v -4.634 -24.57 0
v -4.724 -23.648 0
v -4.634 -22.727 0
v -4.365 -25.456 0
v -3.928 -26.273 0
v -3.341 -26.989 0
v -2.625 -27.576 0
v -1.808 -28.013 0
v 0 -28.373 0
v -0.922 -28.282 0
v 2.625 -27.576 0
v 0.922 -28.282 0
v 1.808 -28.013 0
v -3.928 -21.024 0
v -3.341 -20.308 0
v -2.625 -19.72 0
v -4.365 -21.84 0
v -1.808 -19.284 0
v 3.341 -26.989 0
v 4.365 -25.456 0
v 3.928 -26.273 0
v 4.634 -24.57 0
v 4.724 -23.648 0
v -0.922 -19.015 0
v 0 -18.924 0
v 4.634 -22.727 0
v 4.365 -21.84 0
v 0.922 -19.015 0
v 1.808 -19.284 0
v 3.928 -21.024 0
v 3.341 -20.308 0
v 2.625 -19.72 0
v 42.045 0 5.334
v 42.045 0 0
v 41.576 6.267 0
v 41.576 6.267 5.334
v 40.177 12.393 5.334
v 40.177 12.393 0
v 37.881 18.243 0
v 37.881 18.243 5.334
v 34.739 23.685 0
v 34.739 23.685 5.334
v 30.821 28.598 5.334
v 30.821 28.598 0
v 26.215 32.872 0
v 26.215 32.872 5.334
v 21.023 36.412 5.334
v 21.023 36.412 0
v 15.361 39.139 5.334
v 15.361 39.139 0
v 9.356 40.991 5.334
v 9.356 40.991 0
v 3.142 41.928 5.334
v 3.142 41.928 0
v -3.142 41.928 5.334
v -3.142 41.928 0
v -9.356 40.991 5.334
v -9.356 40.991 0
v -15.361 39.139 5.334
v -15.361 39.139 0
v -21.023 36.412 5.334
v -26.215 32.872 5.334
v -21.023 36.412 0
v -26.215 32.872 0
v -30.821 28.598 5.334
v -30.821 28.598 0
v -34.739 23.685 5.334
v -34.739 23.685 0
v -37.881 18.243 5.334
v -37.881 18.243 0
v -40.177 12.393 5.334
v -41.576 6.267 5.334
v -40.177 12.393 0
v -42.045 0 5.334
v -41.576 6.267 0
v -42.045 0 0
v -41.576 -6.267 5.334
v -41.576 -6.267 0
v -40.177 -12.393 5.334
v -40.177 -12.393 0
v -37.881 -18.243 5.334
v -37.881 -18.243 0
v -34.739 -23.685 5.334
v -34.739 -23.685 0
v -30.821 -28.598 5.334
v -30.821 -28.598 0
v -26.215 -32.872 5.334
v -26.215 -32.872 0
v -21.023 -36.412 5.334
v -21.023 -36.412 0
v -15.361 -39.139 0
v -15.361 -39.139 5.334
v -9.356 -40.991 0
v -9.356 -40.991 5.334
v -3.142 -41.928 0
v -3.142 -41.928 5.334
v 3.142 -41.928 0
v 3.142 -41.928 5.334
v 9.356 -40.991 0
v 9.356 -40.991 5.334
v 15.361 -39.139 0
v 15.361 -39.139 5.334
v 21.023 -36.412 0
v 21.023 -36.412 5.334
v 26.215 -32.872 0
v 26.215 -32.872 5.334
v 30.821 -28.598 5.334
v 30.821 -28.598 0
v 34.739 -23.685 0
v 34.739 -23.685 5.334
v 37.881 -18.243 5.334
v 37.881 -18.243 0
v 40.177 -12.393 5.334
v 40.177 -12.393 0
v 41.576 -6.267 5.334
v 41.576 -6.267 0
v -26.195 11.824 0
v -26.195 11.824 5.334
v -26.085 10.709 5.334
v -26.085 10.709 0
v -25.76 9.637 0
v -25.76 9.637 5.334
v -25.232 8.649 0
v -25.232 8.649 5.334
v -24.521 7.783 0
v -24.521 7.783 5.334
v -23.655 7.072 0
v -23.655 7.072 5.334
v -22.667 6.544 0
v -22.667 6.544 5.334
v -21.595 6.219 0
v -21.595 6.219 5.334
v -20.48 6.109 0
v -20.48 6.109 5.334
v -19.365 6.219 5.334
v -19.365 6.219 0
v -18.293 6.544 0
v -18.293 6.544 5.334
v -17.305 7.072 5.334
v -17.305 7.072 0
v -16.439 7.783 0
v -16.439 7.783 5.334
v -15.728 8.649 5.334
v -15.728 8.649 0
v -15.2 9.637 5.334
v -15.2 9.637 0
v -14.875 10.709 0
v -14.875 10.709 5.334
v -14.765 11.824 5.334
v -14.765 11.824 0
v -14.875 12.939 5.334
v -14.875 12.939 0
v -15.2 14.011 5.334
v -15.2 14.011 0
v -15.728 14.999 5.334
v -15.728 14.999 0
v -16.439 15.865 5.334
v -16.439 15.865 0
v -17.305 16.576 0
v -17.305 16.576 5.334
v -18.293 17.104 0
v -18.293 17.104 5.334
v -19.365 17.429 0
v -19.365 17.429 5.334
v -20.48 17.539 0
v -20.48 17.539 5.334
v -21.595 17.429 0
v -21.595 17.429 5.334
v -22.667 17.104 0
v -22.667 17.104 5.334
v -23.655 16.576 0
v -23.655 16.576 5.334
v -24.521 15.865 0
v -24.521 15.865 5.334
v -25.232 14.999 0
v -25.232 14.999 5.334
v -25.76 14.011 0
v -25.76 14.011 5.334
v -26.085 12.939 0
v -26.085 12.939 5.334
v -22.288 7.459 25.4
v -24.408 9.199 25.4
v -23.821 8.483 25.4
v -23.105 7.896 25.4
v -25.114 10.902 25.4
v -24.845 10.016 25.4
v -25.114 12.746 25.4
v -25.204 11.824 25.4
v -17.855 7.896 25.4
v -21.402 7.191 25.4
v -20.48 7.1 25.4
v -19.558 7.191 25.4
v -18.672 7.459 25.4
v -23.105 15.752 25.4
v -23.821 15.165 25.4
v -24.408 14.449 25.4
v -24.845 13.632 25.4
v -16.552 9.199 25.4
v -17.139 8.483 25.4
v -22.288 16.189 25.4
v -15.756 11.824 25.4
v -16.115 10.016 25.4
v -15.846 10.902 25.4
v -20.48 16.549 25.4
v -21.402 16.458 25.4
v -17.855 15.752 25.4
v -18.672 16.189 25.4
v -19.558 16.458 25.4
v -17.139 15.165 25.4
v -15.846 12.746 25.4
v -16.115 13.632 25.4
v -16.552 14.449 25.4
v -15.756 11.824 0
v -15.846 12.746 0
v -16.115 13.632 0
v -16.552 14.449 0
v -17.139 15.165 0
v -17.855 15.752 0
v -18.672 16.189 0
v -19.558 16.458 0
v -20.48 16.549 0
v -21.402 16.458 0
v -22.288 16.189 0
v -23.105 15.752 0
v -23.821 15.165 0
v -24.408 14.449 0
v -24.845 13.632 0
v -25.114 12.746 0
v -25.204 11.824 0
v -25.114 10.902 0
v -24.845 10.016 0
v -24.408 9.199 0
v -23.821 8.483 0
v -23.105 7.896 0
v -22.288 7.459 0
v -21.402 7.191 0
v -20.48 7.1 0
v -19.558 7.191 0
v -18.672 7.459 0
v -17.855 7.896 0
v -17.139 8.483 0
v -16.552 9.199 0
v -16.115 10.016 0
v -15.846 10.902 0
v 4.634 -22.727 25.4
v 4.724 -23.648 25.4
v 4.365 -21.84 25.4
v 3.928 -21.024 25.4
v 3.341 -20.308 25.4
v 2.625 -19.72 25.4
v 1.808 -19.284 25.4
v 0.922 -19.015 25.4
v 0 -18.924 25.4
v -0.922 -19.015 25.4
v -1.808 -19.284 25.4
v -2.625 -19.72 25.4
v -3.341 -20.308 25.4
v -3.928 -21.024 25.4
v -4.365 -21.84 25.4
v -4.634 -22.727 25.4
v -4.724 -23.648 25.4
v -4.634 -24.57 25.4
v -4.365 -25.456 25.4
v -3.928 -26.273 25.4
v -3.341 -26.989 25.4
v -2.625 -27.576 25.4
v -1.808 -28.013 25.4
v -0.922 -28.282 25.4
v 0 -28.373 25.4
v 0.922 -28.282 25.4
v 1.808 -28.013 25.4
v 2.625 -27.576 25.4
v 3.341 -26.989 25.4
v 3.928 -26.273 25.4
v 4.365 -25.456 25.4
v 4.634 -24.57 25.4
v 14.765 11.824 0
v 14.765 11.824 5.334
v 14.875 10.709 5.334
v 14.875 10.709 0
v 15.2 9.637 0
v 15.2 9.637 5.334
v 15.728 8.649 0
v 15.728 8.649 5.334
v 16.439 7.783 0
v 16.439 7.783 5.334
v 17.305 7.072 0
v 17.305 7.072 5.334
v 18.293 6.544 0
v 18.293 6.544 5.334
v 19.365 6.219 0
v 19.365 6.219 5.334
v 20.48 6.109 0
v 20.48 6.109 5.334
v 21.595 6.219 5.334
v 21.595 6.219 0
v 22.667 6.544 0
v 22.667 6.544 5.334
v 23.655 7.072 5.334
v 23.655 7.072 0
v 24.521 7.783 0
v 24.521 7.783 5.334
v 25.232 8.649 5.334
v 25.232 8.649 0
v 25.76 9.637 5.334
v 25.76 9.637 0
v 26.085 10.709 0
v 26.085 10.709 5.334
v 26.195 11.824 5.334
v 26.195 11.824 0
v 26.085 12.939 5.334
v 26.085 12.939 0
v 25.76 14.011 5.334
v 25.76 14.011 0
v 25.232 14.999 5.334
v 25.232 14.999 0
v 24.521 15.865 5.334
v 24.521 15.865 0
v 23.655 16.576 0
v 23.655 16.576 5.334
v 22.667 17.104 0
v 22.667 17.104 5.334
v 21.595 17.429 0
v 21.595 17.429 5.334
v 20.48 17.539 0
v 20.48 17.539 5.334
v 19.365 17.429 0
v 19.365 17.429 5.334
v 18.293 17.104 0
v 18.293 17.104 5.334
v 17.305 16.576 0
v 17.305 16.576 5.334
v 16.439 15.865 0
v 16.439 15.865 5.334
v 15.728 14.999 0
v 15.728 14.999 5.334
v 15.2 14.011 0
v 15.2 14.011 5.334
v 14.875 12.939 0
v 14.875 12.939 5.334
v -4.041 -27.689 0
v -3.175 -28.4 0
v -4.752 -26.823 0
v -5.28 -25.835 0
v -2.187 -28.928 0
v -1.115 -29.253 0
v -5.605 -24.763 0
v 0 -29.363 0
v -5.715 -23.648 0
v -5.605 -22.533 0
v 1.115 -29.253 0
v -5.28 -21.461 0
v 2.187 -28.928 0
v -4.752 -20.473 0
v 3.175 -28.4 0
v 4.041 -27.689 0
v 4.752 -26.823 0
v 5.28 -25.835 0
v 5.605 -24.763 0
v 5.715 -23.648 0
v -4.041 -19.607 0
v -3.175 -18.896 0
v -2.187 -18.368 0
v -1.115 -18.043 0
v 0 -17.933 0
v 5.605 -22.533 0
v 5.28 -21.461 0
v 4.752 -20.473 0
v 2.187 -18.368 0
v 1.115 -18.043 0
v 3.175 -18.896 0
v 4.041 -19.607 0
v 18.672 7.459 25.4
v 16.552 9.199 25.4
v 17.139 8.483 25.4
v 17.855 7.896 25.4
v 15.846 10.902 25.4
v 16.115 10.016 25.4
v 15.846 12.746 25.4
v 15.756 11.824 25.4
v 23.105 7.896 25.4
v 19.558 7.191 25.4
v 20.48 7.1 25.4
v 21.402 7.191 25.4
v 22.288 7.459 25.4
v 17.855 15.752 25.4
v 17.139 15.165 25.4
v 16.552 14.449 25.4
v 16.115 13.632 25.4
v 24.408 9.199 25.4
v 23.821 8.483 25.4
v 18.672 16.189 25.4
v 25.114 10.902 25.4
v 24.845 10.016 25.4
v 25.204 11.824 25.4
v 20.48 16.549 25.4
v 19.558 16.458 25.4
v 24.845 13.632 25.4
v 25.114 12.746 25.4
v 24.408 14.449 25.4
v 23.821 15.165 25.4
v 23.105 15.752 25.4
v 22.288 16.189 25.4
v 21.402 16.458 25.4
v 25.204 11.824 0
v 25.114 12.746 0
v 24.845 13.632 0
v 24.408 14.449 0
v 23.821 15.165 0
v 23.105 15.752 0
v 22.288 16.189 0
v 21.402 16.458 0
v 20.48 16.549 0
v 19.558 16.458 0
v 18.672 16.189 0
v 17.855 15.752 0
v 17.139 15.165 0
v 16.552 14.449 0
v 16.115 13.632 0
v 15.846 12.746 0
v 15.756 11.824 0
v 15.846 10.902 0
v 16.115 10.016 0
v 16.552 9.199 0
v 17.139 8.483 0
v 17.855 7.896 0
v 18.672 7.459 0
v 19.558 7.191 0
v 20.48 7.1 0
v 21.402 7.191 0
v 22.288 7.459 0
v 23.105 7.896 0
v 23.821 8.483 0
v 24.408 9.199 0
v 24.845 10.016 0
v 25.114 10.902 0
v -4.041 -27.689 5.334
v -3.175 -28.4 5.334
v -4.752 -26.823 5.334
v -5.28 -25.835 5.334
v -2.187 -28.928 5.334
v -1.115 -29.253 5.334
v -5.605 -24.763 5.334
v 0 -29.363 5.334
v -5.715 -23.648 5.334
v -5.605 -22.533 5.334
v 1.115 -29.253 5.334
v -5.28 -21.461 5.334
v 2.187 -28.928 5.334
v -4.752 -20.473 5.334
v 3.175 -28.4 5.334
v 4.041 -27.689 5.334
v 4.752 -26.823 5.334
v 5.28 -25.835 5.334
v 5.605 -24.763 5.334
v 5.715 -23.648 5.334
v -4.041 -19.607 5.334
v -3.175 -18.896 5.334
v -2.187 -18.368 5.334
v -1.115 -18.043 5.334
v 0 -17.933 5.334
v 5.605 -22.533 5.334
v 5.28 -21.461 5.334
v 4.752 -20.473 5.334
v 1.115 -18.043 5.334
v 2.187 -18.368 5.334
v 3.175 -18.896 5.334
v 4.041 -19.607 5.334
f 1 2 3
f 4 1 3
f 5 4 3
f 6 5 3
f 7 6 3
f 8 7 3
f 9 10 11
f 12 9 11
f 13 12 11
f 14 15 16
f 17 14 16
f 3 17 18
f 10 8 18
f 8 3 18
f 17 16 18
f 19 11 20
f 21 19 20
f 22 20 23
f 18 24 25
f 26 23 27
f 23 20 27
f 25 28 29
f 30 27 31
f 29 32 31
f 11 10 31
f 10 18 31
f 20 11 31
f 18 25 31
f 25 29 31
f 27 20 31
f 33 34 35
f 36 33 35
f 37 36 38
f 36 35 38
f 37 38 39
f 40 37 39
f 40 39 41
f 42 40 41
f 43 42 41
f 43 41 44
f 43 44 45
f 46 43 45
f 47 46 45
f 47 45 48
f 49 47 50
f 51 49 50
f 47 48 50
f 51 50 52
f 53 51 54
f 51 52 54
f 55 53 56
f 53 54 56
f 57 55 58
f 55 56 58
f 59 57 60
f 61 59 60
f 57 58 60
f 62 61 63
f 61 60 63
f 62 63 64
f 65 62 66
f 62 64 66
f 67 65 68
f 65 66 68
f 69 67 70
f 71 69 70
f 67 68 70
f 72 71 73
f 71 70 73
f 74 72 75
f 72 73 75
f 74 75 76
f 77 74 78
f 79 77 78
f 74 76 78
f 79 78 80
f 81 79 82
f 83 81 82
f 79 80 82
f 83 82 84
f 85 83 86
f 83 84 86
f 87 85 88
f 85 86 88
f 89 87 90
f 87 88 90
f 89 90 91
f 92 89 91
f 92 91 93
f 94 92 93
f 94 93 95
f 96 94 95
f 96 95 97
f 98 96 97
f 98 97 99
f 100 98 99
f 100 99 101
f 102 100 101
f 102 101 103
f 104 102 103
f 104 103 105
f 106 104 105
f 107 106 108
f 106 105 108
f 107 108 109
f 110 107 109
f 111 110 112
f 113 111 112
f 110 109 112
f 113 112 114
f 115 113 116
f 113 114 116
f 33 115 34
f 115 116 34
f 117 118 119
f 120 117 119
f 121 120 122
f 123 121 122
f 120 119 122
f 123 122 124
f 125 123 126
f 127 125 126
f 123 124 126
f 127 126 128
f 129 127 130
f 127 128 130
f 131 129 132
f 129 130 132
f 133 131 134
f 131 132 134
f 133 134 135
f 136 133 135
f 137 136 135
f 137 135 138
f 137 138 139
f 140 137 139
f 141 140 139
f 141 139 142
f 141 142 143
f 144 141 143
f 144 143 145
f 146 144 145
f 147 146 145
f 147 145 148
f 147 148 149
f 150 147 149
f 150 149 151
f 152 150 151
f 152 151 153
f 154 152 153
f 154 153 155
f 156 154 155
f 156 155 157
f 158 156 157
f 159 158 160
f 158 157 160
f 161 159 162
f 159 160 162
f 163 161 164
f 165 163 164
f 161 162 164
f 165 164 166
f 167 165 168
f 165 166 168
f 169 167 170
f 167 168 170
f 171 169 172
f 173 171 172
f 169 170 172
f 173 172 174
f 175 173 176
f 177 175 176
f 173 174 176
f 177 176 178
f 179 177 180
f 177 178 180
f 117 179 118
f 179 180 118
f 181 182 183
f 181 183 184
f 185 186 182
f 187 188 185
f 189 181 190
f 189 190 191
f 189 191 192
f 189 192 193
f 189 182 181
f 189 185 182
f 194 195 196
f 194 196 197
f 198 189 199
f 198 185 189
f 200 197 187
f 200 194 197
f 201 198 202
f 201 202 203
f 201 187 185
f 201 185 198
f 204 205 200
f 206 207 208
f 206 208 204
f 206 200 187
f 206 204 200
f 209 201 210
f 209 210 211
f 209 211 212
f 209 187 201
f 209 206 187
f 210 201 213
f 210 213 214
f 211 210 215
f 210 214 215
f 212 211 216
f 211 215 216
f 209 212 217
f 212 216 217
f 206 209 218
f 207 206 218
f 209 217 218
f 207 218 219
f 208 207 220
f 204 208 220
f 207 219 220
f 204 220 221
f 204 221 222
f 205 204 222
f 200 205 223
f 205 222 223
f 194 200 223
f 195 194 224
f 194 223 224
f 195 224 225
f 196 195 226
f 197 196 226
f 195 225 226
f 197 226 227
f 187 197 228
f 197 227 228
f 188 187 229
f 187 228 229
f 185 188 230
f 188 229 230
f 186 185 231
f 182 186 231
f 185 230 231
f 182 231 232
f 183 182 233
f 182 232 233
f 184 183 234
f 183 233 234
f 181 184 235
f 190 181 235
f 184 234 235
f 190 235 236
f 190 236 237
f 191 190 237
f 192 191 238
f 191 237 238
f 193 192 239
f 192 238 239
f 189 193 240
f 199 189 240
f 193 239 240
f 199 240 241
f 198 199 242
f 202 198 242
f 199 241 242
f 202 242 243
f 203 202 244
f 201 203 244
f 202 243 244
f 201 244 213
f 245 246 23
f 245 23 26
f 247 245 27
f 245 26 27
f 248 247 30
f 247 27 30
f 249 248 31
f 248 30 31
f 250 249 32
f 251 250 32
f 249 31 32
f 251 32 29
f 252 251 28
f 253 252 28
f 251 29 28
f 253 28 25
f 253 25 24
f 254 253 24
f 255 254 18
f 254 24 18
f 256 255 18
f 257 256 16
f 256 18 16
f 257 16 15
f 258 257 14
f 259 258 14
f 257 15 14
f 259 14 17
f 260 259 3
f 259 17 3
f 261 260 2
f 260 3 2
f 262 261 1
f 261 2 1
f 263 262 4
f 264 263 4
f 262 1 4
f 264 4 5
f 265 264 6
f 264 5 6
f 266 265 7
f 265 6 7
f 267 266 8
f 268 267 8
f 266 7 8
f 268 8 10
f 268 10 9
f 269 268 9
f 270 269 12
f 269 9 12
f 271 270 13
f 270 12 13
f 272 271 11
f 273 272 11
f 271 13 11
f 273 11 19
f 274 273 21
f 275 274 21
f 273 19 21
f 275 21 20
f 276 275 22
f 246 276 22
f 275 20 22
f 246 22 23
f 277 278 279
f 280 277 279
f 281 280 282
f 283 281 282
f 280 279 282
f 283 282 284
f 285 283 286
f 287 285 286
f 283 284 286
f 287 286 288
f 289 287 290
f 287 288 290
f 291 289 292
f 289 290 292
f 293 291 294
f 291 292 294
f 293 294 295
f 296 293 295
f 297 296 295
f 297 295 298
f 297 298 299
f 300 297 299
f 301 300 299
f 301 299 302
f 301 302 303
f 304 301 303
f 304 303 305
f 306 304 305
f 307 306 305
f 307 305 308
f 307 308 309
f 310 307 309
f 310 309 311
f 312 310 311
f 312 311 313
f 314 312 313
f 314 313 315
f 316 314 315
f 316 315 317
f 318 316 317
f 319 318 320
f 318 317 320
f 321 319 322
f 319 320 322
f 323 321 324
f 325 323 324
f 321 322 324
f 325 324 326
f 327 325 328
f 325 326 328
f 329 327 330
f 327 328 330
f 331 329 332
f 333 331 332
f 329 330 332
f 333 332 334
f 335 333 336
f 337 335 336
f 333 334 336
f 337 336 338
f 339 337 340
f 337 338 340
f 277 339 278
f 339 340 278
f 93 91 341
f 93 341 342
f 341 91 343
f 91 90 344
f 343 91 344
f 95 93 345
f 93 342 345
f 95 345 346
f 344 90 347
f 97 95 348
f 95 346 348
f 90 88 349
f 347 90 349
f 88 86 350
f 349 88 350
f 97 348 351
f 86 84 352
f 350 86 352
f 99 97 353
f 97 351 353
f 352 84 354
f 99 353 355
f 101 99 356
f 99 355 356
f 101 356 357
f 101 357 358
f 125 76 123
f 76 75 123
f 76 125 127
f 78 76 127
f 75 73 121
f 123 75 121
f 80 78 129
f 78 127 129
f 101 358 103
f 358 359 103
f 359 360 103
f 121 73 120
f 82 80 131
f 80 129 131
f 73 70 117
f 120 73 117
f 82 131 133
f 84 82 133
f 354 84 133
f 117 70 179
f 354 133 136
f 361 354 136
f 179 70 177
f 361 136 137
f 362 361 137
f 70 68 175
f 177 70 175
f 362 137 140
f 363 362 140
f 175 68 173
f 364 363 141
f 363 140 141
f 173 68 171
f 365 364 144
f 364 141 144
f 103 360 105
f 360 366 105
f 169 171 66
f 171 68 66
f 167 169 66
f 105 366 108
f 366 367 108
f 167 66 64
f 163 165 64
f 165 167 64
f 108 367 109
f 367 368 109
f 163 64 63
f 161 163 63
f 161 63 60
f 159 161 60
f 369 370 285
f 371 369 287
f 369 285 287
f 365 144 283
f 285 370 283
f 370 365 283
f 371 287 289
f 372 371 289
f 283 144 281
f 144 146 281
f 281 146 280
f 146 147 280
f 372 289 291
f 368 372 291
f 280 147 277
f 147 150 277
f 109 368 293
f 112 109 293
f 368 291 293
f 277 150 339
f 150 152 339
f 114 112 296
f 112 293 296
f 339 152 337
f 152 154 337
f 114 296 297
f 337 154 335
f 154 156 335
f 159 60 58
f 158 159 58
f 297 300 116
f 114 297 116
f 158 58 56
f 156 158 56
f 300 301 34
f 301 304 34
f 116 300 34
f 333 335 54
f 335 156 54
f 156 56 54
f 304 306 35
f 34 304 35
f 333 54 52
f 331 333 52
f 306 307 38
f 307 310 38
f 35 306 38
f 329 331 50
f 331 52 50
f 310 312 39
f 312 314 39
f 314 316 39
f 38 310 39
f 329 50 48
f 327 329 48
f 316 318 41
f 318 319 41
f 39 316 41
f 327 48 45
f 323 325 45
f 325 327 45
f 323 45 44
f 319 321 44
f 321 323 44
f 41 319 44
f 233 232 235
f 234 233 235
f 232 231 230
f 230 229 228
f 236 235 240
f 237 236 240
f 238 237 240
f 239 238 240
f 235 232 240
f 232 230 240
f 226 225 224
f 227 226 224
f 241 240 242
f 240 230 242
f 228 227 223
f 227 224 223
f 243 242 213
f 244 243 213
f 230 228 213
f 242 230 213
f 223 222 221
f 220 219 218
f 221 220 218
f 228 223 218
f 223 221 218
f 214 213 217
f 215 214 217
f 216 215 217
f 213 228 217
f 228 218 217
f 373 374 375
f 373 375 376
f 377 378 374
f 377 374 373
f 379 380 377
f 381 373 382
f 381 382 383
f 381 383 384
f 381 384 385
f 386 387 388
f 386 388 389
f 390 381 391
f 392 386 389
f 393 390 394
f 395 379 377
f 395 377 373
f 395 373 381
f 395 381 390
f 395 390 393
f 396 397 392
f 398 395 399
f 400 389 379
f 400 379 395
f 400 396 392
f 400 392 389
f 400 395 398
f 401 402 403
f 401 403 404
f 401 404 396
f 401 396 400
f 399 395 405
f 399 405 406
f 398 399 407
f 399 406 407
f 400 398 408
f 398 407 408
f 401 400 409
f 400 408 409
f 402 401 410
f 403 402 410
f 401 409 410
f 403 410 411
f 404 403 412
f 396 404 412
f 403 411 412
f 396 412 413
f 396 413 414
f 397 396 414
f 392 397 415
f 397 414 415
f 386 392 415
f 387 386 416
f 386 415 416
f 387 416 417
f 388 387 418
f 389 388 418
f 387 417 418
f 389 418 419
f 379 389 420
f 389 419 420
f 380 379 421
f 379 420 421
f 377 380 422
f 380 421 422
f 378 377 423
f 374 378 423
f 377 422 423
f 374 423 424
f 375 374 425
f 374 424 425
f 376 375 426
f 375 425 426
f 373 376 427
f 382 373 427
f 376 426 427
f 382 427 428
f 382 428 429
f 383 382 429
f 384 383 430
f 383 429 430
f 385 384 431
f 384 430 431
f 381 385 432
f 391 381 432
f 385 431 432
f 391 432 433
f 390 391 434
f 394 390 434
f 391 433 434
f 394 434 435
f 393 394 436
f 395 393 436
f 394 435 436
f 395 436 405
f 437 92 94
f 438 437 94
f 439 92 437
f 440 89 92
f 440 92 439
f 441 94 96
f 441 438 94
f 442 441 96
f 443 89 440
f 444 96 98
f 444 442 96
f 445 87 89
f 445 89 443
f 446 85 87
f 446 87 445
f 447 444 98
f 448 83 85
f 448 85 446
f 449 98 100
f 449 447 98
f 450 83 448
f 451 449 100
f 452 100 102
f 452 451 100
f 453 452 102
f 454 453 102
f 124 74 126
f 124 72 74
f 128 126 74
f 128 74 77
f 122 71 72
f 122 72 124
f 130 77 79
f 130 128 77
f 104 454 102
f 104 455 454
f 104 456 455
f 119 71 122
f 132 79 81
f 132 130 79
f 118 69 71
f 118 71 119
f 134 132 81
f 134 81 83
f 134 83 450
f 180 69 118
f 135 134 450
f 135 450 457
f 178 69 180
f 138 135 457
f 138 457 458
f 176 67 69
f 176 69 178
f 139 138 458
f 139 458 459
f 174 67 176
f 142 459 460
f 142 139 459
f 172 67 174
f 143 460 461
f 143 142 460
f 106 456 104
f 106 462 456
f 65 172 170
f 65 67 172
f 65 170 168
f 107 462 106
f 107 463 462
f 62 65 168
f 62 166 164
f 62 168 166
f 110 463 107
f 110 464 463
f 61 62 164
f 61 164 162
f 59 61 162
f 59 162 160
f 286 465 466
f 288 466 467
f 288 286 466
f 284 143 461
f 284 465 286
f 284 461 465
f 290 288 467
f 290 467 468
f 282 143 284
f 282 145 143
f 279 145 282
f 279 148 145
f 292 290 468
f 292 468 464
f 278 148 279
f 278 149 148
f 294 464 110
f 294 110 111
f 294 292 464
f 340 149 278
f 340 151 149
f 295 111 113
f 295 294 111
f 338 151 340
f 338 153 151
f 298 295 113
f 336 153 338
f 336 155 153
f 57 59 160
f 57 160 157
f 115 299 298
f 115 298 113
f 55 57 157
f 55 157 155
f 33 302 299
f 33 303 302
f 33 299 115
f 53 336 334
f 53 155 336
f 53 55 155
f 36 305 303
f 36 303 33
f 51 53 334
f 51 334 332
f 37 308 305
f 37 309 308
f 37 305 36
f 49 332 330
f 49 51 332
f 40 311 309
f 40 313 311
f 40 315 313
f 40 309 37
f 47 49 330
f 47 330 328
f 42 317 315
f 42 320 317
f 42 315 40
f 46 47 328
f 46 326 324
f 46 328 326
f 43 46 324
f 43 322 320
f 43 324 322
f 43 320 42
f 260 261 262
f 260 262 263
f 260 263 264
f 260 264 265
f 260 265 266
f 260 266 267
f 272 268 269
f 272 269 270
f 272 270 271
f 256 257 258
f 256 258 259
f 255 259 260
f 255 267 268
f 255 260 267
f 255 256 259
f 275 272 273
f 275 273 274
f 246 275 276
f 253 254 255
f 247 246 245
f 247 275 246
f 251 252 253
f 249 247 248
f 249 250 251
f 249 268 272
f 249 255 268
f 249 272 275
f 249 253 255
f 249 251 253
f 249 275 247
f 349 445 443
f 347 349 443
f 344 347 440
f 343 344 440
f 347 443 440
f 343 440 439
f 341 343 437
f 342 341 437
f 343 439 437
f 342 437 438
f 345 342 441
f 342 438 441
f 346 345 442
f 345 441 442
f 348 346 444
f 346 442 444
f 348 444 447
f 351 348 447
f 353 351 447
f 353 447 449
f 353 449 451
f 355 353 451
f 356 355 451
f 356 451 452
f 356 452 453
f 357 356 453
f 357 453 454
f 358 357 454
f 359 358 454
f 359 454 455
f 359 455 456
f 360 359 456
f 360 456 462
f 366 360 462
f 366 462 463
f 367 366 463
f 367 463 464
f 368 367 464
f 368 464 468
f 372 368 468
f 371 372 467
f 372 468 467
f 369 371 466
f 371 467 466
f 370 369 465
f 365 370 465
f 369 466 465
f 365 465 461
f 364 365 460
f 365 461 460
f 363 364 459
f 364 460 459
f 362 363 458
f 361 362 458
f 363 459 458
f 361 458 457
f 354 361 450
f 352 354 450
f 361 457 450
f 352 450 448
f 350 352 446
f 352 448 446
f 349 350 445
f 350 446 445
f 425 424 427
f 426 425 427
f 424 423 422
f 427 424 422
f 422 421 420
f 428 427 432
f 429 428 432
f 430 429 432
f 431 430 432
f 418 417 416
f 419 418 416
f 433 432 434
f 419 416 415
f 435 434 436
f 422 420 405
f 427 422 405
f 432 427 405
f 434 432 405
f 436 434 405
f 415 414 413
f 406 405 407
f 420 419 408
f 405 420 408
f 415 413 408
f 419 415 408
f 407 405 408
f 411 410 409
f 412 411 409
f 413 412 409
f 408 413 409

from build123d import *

# Parameters (mm, degrees)
F0_R     = 42.0452361361
F1_DEPTH = 5.334
F3_D     = 11.43
F2_R     = 4.7243980019
F4_DEPTH = 25.4


with BuildPart() as f1:
    # F0 (on Top) → F1 (new body)
    with BuildSketch(Plane.XY):
        Circle(F0_R)
    extrude(amount=F1_DEPTH)

    # F3 (through all)
    with Locations(Plane(origin=(0, 0, 0), x_dir=(1, 0, 0), z_dir=(0, 0, -1))):
        with Locations((-20.4800069598, -11.8241375312), (20.4800069598, -11.8241375312), (0, 23.6482750624)):
            Hole(F3_D / 2)


with BuildPart() as f4:
    # F2 (on Top) → F4 (new body)
    with BuildSketch(Plane.XY):
        with Locations((-20.4800069598, 11.8241375312)):
            Circle(F2_R)
    extrude(amount=F4_DEPTH)


with BuildPart() as f4b:
    # F2 (on Top) → F4, piece 2 (new body)
    with BuildSketch(Plane.XY):
        with Locations((20.4800069598, 11.8241375312)):
            Circle(F2_R)
    extrude(amount=F4_DEPTH)


with BuildPart() as f4c:
    # F2 (on Top) → F4, piece 3 (new body)
    with BuildSketch(Plane.XY):
        with Locations((0, -23.6482750624)):
            Circle(F2_R)
    extrude(amount=F4_DEPTH)


solid = Compound([f1.part, f4.part, f4b.part, f4c.part])
